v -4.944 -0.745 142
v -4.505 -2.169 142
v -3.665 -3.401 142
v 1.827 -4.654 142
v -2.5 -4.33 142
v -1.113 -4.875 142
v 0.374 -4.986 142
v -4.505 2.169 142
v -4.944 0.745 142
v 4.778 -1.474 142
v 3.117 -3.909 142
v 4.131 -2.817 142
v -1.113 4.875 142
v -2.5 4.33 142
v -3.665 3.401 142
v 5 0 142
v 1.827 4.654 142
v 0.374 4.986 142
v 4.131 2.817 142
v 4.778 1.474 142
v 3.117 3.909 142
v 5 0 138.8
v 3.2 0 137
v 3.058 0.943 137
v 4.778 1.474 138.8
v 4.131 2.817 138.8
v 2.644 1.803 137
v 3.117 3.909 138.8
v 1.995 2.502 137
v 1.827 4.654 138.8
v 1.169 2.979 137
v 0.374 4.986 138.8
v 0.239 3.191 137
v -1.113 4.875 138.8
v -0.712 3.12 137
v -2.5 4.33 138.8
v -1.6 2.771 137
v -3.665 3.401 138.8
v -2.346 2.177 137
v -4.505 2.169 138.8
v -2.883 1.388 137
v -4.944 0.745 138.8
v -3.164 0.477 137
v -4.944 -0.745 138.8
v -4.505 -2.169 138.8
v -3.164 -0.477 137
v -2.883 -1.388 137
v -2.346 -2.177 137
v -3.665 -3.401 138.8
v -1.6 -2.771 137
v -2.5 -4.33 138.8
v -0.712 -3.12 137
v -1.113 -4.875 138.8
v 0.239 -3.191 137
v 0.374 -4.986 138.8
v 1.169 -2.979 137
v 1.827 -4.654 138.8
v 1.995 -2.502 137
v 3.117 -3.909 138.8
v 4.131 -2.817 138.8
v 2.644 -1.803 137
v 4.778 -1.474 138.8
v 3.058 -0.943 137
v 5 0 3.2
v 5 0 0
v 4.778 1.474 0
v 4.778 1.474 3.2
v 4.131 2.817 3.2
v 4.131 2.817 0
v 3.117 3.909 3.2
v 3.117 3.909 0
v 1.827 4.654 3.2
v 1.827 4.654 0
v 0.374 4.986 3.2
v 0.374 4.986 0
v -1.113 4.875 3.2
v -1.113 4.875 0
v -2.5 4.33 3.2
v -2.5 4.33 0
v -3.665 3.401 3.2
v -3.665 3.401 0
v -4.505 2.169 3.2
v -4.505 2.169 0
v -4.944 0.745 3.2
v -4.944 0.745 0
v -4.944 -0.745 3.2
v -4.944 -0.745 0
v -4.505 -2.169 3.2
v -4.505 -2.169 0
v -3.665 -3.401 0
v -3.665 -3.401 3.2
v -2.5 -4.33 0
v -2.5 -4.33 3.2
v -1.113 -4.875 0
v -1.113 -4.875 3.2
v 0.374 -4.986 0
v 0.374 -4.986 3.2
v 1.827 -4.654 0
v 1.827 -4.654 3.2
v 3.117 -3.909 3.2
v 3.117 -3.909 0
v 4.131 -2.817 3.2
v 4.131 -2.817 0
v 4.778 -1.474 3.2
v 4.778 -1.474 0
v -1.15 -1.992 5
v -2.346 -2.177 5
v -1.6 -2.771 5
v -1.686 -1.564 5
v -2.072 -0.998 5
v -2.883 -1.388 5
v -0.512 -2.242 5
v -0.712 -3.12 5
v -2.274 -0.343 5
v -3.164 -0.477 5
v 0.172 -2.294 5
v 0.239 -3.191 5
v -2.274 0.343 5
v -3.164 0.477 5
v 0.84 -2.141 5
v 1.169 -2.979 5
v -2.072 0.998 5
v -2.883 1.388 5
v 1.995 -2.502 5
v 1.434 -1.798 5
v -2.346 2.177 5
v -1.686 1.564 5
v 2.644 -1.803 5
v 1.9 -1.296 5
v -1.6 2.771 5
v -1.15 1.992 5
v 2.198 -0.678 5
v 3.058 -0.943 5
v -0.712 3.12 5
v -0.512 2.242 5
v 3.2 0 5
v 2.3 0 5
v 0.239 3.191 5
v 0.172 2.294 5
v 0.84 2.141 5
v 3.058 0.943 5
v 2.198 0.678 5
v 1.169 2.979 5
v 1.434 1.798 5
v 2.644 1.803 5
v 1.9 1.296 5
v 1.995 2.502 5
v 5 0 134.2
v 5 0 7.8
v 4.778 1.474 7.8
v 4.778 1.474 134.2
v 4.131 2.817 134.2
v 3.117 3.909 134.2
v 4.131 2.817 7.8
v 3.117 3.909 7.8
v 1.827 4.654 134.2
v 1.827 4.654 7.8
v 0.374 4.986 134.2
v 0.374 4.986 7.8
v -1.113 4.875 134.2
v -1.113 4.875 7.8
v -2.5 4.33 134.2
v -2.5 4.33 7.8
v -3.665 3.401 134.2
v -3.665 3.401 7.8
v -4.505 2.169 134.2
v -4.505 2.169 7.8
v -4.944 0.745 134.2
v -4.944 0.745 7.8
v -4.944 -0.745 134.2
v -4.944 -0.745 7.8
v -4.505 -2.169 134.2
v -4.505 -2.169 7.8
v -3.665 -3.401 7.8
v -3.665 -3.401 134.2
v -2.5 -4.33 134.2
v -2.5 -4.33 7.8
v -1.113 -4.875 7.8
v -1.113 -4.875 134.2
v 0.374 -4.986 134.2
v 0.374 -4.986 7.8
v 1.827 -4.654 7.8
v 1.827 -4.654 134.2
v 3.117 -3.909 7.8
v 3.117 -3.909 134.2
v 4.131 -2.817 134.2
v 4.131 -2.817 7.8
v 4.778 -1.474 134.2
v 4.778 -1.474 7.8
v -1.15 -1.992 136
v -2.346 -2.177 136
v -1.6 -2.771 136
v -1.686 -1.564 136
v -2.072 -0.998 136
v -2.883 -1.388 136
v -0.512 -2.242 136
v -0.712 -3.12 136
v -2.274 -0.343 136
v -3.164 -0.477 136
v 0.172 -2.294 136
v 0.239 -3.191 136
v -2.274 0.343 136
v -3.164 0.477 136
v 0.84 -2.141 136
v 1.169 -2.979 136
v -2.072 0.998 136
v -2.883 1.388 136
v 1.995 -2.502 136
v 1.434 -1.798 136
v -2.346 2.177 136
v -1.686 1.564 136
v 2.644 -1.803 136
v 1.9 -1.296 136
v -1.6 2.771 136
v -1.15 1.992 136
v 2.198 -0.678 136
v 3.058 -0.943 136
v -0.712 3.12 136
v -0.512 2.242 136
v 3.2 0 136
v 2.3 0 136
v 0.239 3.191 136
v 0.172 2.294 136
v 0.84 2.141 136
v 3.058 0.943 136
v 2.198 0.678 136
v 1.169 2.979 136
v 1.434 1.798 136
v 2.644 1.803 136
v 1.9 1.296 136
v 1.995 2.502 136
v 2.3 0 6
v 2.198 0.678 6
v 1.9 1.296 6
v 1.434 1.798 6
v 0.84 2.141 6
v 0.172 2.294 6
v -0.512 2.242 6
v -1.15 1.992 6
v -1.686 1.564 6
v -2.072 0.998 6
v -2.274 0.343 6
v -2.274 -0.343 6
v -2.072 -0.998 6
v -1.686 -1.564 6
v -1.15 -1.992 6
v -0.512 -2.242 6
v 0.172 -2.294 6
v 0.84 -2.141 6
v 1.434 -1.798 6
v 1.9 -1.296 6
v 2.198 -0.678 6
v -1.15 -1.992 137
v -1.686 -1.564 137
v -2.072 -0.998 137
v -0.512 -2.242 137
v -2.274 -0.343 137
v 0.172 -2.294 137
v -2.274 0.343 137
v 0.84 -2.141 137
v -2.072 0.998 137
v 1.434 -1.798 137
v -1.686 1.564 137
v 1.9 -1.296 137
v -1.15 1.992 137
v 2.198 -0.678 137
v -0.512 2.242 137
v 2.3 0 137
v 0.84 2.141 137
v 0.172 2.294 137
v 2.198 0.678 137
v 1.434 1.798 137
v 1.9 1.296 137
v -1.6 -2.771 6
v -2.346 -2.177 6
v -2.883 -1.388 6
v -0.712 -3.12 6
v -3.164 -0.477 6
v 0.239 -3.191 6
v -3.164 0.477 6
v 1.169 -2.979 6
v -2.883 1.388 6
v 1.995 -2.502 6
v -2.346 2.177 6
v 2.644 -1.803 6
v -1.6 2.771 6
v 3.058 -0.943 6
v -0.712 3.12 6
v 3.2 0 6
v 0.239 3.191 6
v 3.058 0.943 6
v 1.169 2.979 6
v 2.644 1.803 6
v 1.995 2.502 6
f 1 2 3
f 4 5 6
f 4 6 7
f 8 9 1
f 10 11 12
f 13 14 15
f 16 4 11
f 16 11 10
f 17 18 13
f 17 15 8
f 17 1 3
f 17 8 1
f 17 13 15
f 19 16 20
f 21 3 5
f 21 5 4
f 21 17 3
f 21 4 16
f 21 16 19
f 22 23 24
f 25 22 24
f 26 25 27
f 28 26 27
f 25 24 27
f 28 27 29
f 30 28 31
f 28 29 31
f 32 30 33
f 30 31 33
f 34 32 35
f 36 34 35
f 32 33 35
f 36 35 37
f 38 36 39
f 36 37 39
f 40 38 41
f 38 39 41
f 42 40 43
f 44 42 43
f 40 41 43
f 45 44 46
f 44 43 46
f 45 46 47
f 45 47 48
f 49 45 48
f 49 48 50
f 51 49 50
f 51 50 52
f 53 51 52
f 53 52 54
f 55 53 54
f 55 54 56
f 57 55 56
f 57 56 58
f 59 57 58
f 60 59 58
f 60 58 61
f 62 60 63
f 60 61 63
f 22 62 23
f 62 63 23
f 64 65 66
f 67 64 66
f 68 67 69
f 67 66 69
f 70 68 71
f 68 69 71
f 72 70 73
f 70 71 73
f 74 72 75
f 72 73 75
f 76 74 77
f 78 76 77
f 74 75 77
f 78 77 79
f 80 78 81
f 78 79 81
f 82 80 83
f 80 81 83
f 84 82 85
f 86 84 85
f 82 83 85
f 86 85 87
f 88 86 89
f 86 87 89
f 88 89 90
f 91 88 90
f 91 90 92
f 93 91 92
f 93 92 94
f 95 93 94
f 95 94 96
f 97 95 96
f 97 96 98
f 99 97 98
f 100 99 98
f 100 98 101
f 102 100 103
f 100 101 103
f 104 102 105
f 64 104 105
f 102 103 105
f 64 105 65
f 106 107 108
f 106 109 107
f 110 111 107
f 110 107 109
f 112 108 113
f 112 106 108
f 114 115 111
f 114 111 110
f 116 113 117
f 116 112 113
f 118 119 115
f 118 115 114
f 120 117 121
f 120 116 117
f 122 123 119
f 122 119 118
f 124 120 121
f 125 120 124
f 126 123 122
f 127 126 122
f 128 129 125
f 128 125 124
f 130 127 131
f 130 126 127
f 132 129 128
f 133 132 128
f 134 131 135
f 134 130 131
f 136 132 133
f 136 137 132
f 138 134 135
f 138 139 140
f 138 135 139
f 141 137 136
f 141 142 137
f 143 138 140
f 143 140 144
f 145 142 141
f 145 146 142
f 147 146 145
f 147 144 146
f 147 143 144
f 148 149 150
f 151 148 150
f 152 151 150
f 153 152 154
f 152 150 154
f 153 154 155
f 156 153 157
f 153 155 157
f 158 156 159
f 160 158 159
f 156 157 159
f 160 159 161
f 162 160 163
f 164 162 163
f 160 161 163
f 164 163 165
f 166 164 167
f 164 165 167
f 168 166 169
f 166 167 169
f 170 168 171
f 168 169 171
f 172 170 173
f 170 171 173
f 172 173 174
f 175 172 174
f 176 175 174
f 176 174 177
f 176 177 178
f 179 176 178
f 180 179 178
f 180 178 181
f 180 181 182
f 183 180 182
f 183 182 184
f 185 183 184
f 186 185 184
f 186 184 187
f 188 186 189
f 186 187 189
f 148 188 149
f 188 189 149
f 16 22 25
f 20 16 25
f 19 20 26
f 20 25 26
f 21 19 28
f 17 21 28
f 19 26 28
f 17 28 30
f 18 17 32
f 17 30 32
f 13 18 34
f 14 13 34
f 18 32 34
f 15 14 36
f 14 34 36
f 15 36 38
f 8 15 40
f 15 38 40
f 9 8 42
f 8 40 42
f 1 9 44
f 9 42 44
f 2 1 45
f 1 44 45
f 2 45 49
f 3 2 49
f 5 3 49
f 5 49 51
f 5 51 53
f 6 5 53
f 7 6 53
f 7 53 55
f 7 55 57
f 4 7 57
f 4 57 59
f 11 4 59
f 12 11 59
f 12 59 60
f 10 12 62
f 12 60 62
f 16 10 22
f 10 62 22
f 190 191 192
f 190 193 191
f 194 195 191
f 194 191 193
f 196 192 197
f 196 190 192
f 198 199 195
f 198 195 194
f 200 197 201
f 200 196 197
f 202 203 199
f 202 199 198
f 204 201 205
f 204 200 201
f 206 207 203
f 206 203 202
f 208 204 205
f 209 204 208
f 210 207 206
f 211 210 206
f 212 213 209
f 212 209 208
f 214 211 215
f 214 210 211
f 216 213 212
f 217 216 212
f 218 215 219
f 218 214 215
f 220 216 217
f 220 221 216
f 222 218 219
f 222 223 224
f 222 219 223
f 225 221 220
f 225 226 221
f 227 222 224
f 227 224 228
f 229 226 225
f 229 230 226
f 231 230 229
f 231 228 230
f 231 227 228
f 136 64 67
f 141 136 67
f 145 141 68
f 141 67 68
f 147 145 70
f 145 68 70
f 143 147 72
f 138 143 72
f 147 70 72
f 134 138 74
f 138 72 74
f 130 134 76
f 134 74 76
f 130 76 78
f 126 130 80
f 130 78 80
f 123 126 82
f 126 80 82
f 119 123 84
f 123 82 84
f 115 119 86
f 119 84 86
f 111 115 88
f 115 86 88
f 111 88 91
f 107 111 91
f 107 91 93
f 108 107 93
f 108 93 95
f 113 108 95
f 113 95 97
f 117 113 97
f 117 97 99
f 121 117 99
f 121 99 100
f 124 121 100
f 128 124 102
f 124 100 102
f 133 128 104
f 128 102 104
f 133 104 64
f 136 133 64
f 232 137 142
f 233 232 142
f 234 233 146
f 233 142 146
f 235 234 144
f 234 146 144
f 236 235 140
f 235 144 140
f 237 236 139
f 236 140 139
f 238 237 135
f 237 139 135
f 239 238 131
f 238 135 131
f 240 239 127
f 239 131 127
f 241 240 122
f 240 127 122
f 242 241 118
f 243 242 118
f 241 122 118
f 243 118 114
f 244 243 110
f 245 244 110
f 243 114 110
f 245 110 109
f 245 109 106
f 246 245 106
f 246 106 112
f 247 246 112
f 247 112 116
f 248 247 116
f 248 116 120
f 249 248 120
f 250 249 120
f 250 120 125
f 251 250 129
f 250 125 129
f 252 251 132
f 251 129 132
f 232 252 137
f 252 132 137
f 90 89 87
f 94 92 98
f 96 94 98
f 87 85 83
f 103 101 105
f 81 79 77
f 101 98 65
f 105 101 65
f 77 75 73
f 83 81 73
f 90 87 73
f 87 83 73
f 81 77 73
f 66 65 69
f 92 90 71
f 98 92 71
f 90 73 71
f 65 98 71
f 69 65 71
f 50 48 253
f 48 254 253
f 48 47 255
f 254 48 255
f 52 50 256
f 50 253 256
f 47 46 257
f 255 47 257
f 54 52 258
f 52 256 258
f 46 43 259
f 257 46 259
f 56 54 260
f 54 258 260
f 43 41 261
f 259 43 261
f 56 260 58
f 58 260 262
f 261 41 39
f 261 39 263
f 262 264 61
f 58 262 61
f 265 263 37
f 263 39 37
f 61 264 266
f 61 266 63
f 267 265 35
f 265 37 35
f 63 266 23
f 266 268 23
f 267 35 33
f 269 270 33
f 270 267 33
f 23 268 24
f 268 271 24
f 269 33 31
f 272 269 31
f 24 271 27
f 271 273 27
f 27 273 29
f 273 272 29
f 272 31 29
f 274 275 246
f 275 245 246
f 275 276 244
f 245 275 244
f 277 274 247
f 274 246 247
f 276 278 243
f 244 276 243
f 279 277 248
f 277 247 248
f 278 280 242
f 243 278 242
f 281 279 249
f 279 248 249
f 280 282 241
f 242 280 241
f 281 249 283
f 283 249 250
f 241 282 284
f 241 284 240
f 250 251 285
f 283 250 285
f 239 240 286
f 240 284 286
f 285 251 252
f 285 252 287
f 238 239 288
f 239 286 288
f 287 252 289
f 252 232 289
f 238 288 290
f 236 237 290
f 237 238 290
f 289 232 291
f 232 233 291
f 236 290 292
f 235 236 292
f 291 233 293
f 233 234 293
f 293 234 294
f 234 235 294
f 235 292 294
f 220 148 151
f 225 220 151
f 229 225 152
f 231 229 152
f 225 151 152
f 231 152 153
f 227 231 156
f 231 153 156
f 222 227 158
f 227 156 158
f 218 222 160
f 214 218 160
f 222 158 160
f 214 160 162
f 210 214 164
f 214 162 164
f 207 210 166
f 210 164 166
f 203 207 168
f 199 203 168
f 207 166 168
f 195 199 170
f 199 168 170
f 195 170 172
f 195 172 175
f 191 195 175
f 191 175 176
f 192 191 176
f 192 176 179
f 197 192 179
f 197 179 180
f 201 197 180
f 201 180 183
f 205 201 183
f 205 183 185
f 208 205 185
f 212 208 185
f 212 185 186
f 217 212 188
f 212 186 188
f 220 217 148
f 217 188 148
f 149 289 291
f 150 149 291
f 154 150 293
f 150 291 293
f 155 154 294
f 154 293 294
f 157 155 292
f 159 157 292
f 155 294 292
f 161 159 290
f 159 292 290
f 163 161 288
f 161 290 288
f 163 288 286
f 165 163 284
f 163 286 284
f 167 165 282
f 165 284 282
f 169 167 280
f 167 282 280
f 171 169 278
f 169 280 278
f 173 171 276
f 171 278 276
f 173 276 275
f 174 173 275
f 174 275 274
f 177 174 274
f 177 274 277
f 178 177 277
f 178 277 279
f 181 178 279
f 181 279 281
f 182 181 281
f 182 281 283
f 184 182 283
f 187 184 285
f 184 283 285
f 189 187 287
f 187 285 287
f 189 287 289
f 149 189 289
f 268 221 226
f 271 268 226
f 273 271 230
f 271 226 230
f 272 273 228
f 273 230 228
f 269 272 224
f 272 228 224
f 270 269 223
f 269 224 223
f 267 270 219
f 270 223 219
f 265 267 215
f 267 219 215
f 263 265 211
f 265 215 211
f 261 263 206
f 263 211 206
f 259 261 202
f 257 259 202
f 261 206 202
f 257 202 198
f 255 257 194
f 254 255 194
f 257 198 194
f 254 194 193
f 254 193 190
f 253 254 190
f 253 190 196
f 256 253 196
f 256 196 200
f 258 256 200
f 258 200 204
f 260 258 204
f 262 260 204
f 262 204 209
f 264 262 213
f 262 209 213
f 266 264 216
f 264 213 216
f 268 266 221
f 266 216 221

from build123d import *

# Parameters (mm, degrees)
F0_R     = 5
F0_R_2   = 2.3
F1_DEPTH = 5
F2_START = 5
F2_DEPTH = 1
F3_START = 6
F3_DEPTH = 130
F4_START = 136
F4_DEPTH = 1
F5_START = 137
F5_DEPTH = 5
F6_SIZE  = 1.8


with BuildPart() as f1:
    # F0 (on Top) → F1 (new body)
    with BuildSketch(Plane.XY):
        Circle(F0_R)
        Circle(F0_R_2, mode=Mode.SUBTRACT)
        Circle(F0_R_2)
    extrude(amount=F1_DEPTH)

    # F0 (on Top) → F2 (join)
    with BuildSketch(Plane.XY.offset(F2_START)):
        Circle(F0_R_2)
    extrude(amount=F2_DEPTH)

    # F0 (on Top) → F3 (join)
    with BuildSketch(Plane.XY.offset(F3_START)):
        Circle(F0_R)
        Circle(F0_R_2, mode=Mode.SUBTRACT)
        Circle(F0_R_2)
    extrude(amount=F3_DEPTH)

    # F0 (on Top) → F4 (join)
    with BuildSketch(Plane.XY.offset(F4_START)):
        Circle(F0_R_2)
    extrude(amount=F4_DEPTH)

    # F0 (on Top) → F5 (join)
    with BuildSketch(Plane.XY.offset(F5_START)):
        Circle(F0_R)
        Circle(F0_R_2, mode=Mode.SUBTRACT)
        Circle(F0_R_2)
    extrude(amount=F5_DEPTH)

    # F6
    f6_edges = [f1.edges().sort_by_distance(p)[0] for p in [
        (-5, 0, 136),
        (-5, 0, 137),
        (-5, 0, 6),
        (-5, 0, 5),
    ]]
    chamfer(f6_edges, length=F6_SIZE)


solid = f1.part
